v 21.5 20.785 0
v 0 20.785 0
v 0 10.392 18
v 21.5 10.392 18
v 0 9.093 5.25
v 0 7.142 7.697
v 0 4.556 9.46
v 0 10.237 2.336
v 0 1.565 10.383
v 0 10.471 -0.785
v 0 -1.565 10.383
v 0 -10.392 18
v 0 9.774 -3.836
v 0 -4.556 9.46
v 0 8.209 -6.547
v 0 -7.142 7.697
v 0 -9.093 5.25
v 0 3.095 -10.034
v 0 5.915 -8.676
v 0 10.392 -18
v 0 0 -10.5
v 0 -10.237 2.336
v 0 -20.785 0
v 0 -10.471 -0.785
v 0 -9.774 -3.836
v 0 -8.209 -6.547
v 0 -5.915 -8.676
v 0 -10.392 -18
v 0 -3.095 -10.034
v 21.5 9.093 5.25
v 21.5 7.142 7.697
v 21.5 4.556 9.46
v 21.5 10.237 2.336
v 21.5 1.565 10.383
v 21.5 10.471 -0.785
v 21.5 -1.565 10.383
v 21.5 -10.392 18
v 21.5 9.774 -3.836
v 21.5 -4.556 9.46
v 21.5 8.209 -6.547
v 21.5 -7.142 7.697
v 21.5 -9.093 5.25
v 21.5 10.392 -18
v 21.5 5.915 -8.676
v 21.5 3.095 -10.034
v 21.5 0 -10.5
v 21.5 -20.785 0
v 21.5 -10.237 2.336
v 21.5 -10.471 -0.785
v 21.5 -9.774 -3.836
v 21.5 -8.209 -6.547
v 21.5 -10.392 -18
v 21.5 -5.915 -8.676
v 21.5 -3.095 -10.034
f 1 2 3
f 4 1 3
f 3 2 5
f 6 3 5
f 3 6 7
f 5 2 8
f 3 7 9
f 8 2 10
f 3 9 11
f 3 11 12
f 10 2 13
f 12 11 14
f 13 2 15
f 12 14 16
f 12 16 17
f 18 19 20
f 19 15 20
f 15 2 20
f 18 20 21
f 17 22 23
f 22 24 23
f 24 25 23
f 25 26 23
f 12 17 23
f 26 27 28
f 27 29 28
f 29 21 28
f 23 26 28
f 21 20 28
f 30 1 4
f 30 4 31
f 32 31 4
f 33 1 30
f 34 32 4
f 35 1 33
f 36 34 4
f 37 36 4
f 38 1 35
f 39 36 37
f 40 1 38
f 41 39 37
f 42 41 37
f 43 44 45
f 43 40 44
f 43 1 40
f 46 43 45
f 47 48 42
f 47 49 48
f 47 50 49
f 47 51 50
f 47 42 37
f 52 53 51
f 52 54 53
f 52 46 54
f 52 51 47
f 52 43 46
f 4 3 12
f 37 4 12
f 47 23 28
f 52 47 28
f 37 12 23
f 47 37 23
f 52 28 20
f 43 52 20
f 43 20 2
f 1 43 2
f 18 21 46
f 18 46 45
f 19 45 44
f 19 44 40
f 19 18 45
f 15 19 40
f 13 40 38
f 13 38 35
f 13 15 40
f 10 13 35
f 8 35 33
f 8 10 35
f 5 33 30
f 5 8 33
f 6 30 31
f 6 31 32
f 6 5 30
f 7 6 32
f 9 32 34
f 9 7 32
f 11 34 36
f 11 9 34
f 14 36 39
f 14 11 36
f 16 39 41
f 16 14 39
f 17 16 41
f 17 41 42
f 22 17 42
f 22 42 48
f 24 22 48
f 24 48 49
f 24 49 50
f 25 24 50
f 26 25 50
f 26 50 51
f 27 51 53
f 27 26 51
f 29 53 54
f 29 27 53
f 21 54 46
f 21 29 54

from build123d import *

# Parameters (mm, degrees)
BASENUTSKETCH_R = 10.5
BASENUT_DEPTH   = 21.5


with BuildPart() as part:
    # BaseNutSketch → BaseNut (new body)
    with BuildSketch(Plane(origin=(0, 0, 0), x_dir=(0, -1, 0), z_dir=(1, 0, 0))):
        Polygon((10.392304845, 18), (-10.392304845, 18), (-20.784609691, 0), (-10.392304845, -18), (10.392304845, -18), (20.784609691, 0), align=None)
        with Locations(Location((0, 0, 0), (0, 0, 90))):
            Circle(BASENUTSKETCH_R, mode=Mode.SUBTRACT)
    extrude(amount=BASENUT_DEPTH)


solid = part.part
